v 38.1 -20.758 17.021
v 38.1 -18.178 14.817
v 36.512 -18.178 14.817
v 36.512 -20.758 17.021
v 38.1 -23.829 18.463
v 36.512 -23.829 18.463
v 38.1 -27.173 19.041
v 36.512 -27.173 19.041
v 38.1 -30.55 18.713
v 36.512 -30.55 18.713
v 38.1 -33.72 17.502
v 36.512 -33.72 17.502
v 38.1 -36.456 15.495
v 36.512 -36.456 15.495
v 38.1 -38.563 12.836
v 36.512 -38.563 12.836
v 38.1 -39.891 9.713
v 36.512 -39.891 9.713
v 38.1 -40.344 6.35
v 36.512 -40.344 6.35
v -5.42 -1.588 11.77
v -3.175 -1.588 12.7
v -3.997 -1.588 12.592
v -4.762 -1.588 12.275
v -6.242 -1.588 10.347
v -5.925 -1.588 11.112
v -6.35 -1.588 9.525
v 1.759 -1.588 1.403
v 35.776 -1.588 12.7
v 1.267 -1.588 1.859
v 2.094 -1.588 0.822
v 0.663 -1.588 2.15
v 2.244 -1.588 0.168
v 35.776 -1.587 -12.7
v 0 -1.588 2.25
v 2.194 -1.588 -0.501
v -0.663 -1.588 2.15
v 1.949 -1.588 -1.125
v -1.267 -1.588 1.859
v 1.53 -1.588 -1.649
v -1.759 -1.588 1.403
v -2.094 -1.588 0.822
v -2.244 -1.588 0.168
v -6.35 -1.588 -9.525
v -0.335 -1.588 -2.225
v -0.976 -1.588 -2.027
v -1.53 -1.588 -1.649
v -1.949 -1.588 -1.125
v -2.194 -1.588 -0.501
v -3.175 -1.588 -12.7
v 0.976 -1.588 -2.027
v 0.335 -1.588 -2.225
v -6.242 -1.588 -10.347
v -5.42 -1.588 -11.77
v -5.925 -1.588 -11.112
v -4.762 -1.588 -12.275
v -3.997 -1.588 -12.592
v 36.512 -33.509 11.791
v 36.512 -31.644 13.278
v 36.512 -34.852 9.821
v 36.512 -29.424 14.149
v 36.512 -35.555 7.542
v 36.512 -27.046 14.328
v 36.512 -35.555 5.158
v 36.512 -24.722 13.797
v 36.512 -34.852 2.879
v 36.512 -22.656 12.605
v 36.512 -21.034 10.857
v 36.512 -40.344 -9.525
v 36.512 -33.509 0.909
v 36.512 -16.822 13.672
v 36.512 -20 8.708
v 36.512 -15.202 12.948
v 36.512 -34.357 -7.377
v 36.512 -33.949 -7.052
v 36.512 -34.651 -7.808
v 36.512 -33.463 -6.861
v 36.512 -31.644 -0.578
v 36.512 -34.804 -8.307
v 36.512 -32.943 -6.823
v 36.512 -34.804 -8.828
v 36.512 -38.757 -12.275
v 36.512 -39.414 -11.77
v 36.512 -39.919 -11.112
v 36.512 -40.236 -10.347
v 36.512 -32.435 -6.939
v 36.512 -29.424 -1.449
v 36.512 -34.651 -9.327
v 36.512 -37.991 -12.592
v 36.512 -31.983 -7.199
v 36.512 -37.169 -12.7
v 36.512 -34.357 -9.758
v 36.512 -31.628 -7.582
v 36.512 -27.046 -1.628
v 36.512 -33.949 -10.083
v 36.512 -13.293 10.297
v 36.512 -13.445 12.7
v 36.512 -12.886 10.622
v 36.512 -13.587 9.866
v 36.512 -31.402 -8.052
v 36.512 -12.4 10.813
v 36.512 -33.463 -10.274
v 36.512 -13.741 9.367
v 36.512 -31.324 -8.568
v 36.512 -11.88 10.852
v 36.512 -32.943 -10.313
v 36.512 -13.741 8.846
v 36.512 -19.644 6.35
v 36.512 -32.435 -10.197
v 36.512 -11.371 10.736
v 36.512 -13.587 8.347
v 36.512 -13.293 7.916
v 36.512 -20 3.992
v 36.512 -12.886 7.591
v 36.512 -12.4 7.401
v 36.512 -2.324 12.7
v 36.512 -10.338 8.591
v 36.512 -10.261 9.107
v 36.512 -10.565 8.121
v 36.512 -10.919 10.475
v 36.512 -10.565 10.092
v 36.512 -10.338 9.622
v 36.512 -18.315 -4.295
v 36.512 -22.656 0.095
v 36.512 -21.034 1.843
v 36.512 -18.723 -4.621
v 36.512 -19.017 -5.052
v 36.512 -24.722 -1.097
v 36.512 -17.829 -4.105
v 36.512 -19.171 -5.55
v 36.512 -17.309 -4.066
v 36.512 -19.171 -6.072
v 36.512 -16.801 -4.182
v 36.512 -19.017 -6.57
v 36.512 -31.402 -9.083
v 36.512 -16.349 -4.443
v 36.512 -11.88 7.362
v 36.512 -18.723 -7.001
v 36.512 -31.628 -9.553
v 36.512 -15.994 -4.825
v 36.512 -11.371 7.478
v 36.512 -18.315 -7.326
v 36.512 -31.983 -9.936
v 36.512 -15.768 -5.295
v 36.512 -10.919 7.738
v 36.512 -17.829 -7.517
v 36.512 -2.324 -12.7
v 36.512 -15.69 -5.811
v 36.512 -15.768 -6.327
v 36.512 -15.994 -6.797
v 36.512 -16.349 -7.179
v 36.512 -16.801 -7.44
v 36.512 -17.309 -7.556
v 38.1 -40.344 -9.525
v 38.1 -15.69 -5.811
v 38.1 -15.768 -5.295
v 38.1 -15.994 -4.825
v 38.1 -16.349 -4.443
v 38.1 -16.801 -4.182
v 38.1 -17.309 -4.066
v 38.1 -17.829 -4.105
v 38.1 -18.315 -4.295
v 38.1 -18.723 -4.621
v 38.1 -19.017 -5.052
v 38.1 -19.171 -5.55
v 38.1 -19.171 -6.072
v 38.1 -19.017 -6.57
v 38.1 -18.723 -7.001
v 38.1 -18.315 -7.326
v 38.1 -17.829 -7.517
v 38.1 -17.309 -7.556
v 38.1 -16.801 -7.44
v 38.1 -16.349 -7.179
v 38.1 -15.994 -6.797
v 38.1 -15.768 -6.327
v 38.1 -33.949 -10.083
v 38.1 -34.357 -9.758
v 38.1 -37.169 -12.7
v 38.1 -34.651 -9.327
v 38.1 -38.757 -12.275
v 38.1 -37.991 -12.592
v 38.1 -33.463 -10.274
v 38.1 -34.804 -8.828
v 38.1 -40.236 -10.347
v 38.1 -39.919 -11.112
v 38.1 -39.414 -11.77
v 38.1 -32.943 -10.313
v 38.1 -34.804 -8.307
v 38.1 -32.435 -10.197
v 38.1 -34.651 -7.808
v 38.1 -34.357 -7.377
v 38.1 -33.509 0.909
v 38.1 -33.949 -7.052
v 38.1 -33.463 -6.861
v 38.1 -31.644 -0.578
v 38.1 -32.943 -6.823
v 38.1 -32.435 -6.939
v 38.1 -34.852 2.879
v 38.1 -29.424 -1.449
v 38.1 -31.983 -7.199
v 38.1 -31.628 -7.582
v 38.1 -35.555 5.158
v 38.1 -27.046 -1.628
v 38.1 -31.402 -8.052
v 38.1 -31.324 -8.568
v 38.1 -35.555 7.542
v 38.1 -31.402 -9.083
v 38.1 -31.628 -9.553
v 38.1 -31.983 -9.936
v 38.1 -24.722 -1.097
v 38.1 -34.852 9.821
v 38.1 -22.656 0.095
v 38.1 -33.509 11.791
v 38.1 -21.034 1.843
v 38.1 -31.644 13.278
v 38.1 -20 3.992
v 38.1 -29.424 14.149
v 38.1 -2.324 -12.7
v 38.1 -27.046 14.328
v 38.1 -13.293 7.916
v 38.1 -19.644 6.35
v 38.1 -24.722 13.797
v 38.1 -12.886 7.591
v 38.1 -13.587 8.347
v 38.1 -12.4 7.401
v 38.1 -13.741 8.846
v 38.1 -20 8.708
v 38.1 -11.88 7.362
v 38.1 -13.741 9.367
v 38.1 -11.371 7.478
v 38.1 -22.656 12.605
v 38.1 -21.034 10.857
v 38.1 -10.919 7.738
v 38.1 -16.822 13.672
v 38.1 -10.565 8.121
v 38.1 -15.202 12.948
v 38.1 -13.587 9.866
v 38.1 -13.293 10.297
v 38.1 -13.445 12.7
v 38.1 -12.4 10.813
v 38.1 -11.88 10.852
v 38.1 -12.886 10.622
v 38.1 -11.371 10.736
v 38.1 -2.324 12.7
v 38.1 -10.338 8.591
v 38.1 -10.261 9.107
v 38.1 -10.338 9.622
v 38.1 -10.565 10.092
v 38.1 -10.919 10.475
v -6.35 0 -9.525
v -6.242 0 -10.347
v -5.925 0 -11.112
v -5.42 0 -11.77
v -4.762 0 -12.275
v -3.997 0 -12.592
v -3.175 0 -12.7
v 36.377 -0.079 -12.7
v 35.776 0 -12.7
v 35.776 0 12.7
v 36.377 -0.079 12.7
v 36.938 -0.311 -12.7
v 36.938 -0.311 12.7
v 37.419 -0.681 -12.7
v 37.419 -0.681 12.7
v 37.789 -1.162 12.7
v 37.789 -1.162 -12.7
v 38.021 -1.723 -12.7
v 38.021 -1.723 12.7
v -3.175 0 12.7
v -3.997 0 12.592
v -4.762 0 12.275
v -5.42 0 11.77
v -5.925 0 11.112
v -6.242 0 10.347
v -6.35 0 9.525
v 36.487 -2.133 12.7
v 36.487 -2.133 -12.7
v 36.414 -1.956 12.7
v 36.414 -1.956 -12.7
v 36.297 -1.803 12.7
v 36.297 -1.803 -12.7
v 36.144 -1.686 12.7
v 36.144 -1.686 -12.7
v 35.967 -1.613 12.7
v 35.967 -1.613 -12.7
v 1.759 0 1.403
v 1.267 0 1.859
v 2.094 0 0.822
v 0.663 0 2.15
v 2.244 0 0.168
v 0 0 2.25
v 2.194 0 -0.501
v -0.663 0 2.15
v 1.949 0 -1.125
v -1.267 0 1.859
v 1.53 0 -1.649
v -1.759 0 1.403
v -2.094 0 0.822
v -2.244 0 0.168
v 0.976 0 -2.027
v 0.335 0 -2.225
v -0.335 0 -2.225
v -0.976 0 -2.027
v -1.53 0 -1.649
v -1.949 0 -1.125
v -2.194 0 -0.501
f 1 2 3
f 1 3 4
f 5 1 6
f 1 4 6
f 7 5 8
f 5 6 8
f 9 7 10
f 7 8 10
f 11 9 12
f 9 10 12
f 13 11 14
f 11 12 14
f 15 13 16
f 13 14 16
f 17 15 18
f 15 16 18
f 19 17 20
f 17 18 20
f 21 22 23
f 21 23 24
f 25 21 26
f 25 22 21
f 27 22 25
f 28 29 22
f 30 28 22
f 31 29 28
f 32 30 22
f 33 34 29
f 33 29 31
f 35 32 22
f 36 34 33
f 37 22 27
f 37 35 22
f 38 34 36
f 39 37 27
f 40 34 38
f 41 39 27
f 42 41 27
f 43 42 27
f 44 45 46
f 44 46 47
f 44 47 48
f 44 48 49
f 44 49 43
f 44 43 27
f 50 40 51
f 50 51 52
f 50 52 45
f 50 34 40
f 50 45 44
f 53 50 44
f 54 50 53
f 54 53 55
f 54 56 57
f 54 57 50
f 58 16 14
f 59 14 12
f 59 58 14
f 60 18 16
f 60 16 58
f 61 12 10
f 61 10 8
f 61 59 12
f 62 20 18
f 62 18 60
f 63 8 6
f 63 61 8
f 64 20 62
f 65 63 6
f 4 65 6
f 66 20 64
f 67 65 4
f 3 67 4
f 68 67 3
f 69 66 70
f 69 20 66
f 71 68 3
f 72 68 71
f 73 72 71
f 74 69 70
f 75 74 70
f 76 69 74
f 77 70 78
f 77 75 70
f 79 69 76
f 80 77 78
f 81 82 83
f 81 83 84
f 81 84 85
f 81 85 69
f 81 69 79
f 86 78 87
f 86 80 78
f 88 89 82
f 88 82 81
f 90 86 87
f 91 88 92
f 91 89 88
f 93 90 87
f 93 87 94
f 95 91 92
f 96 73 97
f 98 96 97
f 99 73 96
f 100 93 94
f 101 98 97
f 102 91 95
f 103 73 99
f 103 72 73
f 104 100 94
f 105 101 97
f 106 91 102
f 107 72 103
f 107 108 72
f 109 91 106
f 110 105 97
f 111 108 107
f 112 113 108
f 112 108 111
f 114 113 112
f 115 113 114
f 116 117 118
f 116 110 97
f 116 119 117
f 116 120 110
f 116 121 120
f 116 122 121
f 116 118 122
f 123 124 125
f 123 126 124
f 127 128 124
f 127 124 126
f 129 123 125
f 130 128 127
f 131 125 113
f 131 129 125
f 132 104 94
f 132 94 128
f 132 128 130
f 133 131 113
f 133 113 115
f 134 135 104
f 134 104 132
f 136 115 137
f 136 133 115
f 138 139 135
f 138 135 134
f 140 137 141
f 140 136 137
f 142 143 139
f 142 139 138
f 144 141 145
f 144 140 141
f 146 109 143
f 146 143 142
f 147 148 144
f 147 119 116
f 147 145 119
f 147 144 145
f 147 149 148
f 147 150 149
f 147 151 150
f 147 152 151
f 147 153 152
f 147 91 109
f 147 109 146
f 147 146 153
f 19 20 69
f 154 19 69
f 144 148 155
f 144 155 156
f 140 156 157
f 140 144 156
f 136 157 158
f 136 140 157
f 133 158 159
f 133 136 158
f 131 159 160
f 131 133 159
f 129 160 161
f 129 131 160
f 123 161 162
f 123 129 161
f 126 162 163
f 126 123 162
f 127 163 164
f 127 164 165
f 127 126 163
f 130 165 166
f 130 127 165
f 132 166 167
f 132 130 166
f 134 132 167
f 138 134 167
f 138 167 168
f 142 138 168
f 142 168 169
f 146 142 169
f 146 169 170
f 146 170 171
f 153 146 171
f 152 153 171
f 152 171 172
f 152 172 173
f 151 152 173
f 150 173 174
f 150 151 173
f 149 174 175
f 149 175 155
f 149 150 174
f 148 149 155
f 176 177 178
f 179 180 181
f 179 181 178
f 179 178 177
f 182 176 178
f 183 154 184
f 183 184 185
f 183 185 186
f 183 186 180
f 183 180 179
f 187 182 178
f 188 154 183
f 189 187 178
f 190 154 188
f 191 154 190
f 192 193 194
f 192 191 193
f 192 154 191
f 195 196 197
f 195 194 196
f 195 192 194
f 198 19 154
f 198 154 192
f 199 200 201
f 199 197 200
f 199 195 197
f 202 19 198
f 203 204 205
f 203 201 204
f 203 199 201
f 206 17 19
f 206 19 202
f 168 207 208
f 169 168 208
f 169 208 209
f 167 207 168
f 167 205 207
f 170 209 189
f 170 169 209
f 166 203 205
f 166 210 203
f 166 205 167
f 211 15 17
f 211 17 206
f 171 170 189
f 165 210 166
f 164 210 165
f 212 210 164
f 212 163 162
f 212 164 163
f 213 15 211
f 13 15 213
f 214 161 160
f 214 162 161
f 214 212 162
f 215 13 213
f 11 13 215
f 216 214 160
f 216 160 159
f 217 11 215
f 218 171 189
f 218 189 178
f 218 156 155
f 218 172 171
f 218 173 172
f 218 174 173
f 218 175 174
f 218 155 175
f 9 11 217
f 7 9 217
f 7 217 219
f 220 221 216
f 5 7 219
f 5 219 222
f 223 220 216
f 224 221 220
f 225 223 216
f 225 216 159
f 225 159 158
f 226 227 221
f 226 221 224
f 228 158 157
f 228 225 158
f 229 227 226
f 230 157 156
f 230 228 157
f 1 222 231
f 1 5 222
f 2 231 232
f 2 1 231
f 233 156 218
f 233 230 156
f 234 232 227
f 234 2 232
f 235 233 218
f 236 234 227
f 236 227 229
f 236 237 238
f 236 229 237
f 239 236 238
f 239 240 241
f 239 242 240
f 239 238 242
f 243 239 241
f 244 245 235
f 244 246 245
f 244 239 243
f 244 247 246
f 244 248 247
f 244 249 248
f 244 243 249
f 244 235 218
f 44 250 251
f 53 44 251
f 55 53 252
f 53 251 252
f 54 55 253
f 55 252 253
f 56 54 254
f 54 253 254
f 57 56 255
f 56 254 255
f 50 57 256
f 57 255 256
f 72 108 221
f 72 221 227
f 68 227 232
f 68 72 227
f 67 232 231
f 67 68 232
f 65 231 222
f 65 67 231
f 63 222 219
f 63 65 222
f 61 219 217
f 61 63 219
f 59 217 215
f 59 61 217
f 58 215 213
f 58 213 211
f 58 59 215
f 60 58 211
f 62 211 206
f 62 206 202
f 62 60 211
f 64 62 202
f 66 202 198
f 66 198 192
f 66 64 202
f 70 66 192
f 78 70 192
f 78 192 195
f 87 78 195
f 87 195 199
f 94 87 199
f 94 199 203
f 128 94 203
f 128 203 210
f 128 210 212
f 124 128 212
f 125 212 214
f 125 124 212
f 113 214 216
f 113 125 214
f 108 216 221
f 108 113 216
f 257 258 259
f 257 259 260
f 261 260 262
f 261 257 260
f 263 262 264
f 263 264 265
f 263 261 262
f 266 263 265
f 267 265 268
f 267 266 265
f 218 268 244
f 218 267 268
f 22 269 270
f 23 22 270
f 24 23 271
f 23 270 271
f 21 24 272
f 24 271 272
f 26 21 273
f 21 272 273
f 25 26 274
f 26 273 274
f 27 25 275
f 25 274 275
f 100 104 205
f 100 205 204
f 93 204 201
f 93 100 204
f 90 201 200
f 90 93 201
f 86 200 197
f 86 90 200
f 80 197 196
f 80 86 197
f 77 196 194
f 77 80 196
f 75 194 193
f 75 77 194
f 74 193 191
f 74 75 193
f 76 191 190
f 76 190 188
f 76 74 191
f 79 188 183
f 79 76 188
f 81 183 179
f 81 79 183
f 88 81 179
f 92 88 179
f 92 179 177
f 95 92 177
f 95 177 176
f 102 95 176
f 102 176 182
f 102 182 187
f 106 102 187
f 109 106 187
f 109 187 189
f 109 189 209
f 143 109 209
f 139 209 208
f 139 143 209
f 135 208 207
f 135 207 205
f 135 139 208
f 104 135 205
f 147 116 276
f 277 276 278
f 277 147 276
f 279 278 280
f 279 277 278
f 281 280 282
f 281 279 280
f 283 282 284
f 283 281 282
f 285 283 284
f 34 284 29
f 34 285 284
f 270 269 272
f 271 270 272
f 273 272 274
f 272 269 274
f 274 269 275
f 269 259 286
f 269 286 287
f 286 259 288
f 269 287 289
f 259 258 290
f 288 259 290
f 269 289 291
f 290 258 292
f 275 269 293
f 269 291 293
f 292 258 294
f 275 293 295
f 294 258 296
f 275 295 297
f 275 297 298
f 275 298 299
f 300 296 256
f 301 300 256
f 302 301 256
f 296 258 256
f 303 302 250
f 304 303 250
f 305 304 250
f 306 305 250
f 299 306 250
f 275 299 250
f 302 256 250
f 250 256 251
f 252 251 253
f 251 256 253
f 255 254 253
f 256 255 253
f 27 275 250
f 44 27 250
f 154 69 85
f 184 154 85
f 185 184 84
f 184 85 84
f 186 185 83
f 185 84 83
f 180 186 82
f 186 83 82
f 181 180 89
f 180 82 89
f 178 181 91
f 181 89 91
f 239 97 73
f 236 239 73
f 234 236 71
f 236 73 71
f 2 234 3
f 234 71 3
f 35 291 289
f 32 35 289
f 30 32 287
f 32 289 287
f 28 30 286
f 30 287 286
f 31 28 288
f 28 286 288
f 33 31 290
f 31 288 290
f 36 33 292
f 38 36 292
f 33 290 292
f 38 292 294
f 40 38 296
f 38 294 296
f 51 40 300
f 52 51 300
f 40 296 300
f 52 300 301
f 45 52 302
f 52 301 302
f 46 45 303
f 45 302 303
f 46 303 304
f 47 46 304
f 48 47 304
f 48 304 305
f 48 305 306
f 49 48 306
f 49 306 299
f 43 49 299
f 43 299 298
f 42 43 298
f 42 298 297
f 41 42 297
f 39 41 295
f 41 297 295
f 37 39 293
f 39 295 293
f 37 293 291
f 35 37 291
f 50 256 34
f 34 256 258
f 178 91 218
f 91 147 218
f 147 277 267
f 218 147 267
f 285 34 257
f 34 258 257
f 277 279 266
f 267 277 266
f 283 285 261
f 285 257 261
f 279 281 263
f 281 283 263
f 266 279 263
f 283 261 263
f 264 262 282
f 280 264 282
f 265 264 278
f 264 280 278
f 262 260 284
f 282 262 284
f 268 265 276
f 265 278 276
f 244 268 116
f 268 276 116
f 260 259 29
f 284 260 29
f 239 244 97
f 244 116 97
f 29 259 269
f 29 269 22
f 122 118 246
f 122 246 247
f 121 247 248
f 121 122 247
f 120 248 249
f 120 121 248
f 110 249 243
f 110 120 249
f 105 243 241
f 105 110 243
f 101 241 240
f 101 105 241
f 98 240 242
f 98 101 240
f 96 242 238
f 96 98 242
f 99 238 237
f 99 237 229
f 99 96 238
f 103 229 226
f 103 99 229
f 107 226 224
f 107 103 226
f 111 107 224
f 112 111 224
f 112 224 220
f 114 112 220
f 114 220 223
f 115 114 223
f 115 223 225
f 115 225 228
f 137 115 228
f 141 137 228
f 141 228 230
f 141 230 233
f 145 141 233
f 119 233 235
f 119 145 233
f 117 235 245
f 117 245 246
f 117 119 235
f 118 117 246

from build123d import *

# Parameters (mm, degrees)
SKETCH1_R                    = 2.25
SKETCH1_R_2                  = 8
SKETCH1_R_3                  = 1.75
BASE_FLANGE1_DEPTH           = 1.5875
SKETCHED_START               = 38.1
SKETCHED_BEND1_OUTLINE_W     = 1.5875
SKETCHED_BEND1_OUTLINE_H     = 25.4
SKETCHED_BEND1_DEPTH         = 38.1
SKETCHED_START_2             = 36.5125
SKETCHED_BEND1_2_OUTLINE_R   = 1.75
SKETCHED_BEND1_2_OUTLINE_R_2 = 8
SKETCHED_BEND1_2_DEPTH       = 1.361458034
SKETCHED_START_3             = 35.7759
SKETCHED_BEND1_3_OUTLINE_R   = 1.75
SKETCHED_BEND1_3_OUTLINE_R_2 = 8
SKETCHED_BEND1_3_DEPTH       = 2.3241
SKETCHED_START_4             = -12.7
SKETCHED_BEND1_4_DEPTH       = 31.75
SKETCHED_START_5             = -1.5875
SKETCHED_BEND1_5_DEPTH       = 1.5875


with BuildPart() as part:
    # Base-Flange1: sheet metal written as solids
    # Sketch1 → Base-Flange1 (new body)
    with BuildSketch(Plane(origin=(0, 0, 0), x_dir=(1, 0, 0), z_dir=(0, 1, 0))):
        with BuildLine():
            Line((-3.175, 12.7), (38.1, 12.7))
            Line((38.1, 12.7), (73.025, 12.7))
            ThreePointArc((73.025, 12.7), (75.27006403, 11.77006403), (76.2, 9.525))
            Line((76.2, 9.525), (76.2, -6.35))
            ThreePointArc((76.2, -6.35), (68.03164054, -18.213988959), (54.033978895, -14.816666667))
            ThreePointArc((54.033978895, -14.816666667), (51.893344987, -13.2532696), (49.300968343, -12.7))
            Line((49.300968343, -12.7), (38.1, -12.7))
            Line((38.1, -12.7), (-3.175, -12.7))
            ThreePointArc((-3.175, -12.7), (-5.42006403, -11.77006403), (-6.35, -9.525))
            Line((-6.35, -9.525), (-6.35, 9.525))
            ThreePointArc((-6.35, 9.525), (-5.42006403, 11.77006403), (-3.175, 12.7))
        make_face()
        with Locations(Location((0, 0, 0), (0, 0, 270))):
            Circle(SKETCH1_R, mode=Mode.SUBTRACT)
        with Locations(Location((63.5, -6.35, 0), (0, 0, 270))):
            Circle(SKETCH1_R_2, mode=Mode.SUBTRACT)
        with Locations(Location((47.866176921, -9.10666482, 0), (0, 0, 270))):
            Circle(SKETCH1_R_3, mode=Mode.SUBTRACT)
        with Locations(Location((53.295746696, 5.810955535, 0), (0, 0, 270))):
            Circle(SKETCH1_R_3, mode=Mode.SUBTRACT)
        with Locations(Location((68.929569775, 8.567620355, 0), (0, 0, 270))):
            Circle(SKETCH1_R_3, mode=Mode.SUBTRACT)
    extrude(amount=-BASE_FLANGE1_DEPTH)

    # Sketched Bend1: read off the stored shape, not the designer's step
    # Sketched Bend1 outline → Sketched Bend1 (cut)
    with BuildSketch(Plane.YZ.offset(SKETCHED_START)):
        with Locations((-0.79375, 0)):
            Rectangle(SKETCHED_BEND1_OUTLINE_W, SKETCHED_BEND1_OUTLINE_H)
    extrude(amount=SKETCHED_BEND1_DEPTH, mode=Mode.SUBTRACT)

    # Sketched Bend1 2 outline → Sketched Bend1 2 (add)
    with BuildSketch(Plane.YZ.offset(SKETCHED_START_2)):
        with BuildLine():
            Line((-1.5875, 12.7), (-13.445300184, 12.7))
            ThreePointArc((-13.445300184, 12.7), (-16.037676829, 13.2532696), (-18.178310737, 14.816666667))
            ThreePointArc((-18.178310737, 14.816666667), (-32.175972382, 18.213988959), (-40.344331841, 6.35))
            Line((-40.344331841, 6.35), (-40.344331841, -9.525))
            ThreePointArc((-40.344331841, -9.525), (-39.414395871, -11.77006403), (-37.169331841, -12.7))
            Line((-37.169331841, -12.7), (-1.5875, -12.7))
            Line((-1.5875, -12.7), (-1.5875, 12.7))
        make_face()
        with Locations((-33.073901617, -8.567620355)):
            Circle(SKETCHED_BEND1_2_OUTLINE_R, mode=Mode.SUBTRACT)
        with Locations((-17.440078538, -5.810955535)):
            Circle(SKETCHED_BEND1_2_OUTLINE_R, mode=Mode.SUBTRACT)
        with Locations((-27.644331841, 6.35)):
            Circle(SKETCHED_BEND1_2_OUTLINE_R_2, mode=Mode.SUBTRACT)
        with Locations((-12.010508762, 9.10666482)):
            Circle(SKETCHED_BEND1_2_OUTLINE_R, mode=Mode.SUBTRACT)
    extrude(amount=SKETCHED_BEND1_2_DEPTH)

    # Sketched Bend1 3 outline → Sketched Bend1 3 (add)
    with BuildSketch(Plane.YZ.offset(SKETCHED_START_3)):
        with BuildLine():
            Line((-1.5875, 12.7), (-13.445300184, 12.7))
            ThreePointArc((-13.445300184, 12.7), (-16.037676829, 13.2532696), (-18.178310737, 14.816666667))
            ThreePointArc((-18.178310737, 14.816666667), (-32.175972382, 18.213988959), (-40.344331841, 6.35))
            Line((-40.344331841, 6.35), (-40.344331841, -9.525))
            ThreePointArc((-40.344331841, -9.525), (-39.414395871, -11.77006403), (-37.169331841, -12.7))
            Line((-37.169331841, -12.7), (-1.5875, -12.7))
            Line((-1.5875, -12.7), (-1.5875, 12.7))
        make_face()
        with Locations((-33.073901617, -8.567620355)):
            Circle(SKETCHED_BEND1_3_OUTLINE_R, mode=Mode.SUBTRACT)
        with Locations((-17.440078538, -5.810955535)):
            Circle(SKETCHED_BEND1_3_OUTLINE_R, mode=Mode.SUBTRACT)
        with Locations((-27.644331841, 6.35)):
            Circle(SKETCHED_BEND1_3_OUTLINE_R_2, mode=Mode.SUBTRACT)
        with Locations((-12.010508762, 9.10666482)):
            Circle(SKETCHED_BEND1_3_OUTLINE_R, mode=Mode.SUBTRACT)
    extrude(amount=SKETCHED_BEND1_3_DEPTH)

    # Sketched Bend1 4 outline → Sketched Bend1 4 (cut)
    with BuildSketch(Plane.XY.offset(SKETCHED_START_4)):
        with BuildLine():
            ThreePointArc((35.7759, 0), (37.41928687, -0.68071313), (38.1, -2.3241))
            Line((38.1, -2.3241), (38.1, 0))
            Line((38.1, 0), (35.7759, 0))
        make_face()
        with BuildLine():
            Line((36.5125, -40.344331841), (36.5125, -2.3241))
            ThreePointArc((36.5125, -2.3241), (36.296754855, -1.803245145), (35.7759, -1.5875))
            Line((35.7759, -1.5875), (35.7759, -40.344331841))
            Line((35.7759, -40.344331841), (36.5125, -40.344331841))
        make_face()
    extrude(amount=SKETCHED_BEND1_4_DEPTH, mode=Mode.SUBTRACT)

    # Sketched Bend1 5 outline → Sketched Bend1 5 (cut)
    with BuildSketch(Plane(origin=(0, 0, 0), x_dir=(1, 0, 0), z_dir=(0, 1, 0)).offset(SKETCHED_START_5)):
        with BuildLine():
            ThreePointArc((49.300968343, -12.7), (51.893344987, -13.2532696), (54.033978895, -14.816666667))
            ThreePointArc((54.033978895, -14.816666667), (64.80660234, -18.982608215), (74.498522628, -12.7))
            Line((74.498522628, -12.7), (68.365953144, -12.7))
            ThreePointArc((68.365953144, -12.7), (63.5, -14.35), (58.634046856, -12.7))
            Line((58.634046856, -12.7), (49.300968343, -12.7))
        make_face()
    extrude(amount=SKETCHED_BEND1_5_DEPTH, mode=Mode.SUBTRACT)


solid = part.part
